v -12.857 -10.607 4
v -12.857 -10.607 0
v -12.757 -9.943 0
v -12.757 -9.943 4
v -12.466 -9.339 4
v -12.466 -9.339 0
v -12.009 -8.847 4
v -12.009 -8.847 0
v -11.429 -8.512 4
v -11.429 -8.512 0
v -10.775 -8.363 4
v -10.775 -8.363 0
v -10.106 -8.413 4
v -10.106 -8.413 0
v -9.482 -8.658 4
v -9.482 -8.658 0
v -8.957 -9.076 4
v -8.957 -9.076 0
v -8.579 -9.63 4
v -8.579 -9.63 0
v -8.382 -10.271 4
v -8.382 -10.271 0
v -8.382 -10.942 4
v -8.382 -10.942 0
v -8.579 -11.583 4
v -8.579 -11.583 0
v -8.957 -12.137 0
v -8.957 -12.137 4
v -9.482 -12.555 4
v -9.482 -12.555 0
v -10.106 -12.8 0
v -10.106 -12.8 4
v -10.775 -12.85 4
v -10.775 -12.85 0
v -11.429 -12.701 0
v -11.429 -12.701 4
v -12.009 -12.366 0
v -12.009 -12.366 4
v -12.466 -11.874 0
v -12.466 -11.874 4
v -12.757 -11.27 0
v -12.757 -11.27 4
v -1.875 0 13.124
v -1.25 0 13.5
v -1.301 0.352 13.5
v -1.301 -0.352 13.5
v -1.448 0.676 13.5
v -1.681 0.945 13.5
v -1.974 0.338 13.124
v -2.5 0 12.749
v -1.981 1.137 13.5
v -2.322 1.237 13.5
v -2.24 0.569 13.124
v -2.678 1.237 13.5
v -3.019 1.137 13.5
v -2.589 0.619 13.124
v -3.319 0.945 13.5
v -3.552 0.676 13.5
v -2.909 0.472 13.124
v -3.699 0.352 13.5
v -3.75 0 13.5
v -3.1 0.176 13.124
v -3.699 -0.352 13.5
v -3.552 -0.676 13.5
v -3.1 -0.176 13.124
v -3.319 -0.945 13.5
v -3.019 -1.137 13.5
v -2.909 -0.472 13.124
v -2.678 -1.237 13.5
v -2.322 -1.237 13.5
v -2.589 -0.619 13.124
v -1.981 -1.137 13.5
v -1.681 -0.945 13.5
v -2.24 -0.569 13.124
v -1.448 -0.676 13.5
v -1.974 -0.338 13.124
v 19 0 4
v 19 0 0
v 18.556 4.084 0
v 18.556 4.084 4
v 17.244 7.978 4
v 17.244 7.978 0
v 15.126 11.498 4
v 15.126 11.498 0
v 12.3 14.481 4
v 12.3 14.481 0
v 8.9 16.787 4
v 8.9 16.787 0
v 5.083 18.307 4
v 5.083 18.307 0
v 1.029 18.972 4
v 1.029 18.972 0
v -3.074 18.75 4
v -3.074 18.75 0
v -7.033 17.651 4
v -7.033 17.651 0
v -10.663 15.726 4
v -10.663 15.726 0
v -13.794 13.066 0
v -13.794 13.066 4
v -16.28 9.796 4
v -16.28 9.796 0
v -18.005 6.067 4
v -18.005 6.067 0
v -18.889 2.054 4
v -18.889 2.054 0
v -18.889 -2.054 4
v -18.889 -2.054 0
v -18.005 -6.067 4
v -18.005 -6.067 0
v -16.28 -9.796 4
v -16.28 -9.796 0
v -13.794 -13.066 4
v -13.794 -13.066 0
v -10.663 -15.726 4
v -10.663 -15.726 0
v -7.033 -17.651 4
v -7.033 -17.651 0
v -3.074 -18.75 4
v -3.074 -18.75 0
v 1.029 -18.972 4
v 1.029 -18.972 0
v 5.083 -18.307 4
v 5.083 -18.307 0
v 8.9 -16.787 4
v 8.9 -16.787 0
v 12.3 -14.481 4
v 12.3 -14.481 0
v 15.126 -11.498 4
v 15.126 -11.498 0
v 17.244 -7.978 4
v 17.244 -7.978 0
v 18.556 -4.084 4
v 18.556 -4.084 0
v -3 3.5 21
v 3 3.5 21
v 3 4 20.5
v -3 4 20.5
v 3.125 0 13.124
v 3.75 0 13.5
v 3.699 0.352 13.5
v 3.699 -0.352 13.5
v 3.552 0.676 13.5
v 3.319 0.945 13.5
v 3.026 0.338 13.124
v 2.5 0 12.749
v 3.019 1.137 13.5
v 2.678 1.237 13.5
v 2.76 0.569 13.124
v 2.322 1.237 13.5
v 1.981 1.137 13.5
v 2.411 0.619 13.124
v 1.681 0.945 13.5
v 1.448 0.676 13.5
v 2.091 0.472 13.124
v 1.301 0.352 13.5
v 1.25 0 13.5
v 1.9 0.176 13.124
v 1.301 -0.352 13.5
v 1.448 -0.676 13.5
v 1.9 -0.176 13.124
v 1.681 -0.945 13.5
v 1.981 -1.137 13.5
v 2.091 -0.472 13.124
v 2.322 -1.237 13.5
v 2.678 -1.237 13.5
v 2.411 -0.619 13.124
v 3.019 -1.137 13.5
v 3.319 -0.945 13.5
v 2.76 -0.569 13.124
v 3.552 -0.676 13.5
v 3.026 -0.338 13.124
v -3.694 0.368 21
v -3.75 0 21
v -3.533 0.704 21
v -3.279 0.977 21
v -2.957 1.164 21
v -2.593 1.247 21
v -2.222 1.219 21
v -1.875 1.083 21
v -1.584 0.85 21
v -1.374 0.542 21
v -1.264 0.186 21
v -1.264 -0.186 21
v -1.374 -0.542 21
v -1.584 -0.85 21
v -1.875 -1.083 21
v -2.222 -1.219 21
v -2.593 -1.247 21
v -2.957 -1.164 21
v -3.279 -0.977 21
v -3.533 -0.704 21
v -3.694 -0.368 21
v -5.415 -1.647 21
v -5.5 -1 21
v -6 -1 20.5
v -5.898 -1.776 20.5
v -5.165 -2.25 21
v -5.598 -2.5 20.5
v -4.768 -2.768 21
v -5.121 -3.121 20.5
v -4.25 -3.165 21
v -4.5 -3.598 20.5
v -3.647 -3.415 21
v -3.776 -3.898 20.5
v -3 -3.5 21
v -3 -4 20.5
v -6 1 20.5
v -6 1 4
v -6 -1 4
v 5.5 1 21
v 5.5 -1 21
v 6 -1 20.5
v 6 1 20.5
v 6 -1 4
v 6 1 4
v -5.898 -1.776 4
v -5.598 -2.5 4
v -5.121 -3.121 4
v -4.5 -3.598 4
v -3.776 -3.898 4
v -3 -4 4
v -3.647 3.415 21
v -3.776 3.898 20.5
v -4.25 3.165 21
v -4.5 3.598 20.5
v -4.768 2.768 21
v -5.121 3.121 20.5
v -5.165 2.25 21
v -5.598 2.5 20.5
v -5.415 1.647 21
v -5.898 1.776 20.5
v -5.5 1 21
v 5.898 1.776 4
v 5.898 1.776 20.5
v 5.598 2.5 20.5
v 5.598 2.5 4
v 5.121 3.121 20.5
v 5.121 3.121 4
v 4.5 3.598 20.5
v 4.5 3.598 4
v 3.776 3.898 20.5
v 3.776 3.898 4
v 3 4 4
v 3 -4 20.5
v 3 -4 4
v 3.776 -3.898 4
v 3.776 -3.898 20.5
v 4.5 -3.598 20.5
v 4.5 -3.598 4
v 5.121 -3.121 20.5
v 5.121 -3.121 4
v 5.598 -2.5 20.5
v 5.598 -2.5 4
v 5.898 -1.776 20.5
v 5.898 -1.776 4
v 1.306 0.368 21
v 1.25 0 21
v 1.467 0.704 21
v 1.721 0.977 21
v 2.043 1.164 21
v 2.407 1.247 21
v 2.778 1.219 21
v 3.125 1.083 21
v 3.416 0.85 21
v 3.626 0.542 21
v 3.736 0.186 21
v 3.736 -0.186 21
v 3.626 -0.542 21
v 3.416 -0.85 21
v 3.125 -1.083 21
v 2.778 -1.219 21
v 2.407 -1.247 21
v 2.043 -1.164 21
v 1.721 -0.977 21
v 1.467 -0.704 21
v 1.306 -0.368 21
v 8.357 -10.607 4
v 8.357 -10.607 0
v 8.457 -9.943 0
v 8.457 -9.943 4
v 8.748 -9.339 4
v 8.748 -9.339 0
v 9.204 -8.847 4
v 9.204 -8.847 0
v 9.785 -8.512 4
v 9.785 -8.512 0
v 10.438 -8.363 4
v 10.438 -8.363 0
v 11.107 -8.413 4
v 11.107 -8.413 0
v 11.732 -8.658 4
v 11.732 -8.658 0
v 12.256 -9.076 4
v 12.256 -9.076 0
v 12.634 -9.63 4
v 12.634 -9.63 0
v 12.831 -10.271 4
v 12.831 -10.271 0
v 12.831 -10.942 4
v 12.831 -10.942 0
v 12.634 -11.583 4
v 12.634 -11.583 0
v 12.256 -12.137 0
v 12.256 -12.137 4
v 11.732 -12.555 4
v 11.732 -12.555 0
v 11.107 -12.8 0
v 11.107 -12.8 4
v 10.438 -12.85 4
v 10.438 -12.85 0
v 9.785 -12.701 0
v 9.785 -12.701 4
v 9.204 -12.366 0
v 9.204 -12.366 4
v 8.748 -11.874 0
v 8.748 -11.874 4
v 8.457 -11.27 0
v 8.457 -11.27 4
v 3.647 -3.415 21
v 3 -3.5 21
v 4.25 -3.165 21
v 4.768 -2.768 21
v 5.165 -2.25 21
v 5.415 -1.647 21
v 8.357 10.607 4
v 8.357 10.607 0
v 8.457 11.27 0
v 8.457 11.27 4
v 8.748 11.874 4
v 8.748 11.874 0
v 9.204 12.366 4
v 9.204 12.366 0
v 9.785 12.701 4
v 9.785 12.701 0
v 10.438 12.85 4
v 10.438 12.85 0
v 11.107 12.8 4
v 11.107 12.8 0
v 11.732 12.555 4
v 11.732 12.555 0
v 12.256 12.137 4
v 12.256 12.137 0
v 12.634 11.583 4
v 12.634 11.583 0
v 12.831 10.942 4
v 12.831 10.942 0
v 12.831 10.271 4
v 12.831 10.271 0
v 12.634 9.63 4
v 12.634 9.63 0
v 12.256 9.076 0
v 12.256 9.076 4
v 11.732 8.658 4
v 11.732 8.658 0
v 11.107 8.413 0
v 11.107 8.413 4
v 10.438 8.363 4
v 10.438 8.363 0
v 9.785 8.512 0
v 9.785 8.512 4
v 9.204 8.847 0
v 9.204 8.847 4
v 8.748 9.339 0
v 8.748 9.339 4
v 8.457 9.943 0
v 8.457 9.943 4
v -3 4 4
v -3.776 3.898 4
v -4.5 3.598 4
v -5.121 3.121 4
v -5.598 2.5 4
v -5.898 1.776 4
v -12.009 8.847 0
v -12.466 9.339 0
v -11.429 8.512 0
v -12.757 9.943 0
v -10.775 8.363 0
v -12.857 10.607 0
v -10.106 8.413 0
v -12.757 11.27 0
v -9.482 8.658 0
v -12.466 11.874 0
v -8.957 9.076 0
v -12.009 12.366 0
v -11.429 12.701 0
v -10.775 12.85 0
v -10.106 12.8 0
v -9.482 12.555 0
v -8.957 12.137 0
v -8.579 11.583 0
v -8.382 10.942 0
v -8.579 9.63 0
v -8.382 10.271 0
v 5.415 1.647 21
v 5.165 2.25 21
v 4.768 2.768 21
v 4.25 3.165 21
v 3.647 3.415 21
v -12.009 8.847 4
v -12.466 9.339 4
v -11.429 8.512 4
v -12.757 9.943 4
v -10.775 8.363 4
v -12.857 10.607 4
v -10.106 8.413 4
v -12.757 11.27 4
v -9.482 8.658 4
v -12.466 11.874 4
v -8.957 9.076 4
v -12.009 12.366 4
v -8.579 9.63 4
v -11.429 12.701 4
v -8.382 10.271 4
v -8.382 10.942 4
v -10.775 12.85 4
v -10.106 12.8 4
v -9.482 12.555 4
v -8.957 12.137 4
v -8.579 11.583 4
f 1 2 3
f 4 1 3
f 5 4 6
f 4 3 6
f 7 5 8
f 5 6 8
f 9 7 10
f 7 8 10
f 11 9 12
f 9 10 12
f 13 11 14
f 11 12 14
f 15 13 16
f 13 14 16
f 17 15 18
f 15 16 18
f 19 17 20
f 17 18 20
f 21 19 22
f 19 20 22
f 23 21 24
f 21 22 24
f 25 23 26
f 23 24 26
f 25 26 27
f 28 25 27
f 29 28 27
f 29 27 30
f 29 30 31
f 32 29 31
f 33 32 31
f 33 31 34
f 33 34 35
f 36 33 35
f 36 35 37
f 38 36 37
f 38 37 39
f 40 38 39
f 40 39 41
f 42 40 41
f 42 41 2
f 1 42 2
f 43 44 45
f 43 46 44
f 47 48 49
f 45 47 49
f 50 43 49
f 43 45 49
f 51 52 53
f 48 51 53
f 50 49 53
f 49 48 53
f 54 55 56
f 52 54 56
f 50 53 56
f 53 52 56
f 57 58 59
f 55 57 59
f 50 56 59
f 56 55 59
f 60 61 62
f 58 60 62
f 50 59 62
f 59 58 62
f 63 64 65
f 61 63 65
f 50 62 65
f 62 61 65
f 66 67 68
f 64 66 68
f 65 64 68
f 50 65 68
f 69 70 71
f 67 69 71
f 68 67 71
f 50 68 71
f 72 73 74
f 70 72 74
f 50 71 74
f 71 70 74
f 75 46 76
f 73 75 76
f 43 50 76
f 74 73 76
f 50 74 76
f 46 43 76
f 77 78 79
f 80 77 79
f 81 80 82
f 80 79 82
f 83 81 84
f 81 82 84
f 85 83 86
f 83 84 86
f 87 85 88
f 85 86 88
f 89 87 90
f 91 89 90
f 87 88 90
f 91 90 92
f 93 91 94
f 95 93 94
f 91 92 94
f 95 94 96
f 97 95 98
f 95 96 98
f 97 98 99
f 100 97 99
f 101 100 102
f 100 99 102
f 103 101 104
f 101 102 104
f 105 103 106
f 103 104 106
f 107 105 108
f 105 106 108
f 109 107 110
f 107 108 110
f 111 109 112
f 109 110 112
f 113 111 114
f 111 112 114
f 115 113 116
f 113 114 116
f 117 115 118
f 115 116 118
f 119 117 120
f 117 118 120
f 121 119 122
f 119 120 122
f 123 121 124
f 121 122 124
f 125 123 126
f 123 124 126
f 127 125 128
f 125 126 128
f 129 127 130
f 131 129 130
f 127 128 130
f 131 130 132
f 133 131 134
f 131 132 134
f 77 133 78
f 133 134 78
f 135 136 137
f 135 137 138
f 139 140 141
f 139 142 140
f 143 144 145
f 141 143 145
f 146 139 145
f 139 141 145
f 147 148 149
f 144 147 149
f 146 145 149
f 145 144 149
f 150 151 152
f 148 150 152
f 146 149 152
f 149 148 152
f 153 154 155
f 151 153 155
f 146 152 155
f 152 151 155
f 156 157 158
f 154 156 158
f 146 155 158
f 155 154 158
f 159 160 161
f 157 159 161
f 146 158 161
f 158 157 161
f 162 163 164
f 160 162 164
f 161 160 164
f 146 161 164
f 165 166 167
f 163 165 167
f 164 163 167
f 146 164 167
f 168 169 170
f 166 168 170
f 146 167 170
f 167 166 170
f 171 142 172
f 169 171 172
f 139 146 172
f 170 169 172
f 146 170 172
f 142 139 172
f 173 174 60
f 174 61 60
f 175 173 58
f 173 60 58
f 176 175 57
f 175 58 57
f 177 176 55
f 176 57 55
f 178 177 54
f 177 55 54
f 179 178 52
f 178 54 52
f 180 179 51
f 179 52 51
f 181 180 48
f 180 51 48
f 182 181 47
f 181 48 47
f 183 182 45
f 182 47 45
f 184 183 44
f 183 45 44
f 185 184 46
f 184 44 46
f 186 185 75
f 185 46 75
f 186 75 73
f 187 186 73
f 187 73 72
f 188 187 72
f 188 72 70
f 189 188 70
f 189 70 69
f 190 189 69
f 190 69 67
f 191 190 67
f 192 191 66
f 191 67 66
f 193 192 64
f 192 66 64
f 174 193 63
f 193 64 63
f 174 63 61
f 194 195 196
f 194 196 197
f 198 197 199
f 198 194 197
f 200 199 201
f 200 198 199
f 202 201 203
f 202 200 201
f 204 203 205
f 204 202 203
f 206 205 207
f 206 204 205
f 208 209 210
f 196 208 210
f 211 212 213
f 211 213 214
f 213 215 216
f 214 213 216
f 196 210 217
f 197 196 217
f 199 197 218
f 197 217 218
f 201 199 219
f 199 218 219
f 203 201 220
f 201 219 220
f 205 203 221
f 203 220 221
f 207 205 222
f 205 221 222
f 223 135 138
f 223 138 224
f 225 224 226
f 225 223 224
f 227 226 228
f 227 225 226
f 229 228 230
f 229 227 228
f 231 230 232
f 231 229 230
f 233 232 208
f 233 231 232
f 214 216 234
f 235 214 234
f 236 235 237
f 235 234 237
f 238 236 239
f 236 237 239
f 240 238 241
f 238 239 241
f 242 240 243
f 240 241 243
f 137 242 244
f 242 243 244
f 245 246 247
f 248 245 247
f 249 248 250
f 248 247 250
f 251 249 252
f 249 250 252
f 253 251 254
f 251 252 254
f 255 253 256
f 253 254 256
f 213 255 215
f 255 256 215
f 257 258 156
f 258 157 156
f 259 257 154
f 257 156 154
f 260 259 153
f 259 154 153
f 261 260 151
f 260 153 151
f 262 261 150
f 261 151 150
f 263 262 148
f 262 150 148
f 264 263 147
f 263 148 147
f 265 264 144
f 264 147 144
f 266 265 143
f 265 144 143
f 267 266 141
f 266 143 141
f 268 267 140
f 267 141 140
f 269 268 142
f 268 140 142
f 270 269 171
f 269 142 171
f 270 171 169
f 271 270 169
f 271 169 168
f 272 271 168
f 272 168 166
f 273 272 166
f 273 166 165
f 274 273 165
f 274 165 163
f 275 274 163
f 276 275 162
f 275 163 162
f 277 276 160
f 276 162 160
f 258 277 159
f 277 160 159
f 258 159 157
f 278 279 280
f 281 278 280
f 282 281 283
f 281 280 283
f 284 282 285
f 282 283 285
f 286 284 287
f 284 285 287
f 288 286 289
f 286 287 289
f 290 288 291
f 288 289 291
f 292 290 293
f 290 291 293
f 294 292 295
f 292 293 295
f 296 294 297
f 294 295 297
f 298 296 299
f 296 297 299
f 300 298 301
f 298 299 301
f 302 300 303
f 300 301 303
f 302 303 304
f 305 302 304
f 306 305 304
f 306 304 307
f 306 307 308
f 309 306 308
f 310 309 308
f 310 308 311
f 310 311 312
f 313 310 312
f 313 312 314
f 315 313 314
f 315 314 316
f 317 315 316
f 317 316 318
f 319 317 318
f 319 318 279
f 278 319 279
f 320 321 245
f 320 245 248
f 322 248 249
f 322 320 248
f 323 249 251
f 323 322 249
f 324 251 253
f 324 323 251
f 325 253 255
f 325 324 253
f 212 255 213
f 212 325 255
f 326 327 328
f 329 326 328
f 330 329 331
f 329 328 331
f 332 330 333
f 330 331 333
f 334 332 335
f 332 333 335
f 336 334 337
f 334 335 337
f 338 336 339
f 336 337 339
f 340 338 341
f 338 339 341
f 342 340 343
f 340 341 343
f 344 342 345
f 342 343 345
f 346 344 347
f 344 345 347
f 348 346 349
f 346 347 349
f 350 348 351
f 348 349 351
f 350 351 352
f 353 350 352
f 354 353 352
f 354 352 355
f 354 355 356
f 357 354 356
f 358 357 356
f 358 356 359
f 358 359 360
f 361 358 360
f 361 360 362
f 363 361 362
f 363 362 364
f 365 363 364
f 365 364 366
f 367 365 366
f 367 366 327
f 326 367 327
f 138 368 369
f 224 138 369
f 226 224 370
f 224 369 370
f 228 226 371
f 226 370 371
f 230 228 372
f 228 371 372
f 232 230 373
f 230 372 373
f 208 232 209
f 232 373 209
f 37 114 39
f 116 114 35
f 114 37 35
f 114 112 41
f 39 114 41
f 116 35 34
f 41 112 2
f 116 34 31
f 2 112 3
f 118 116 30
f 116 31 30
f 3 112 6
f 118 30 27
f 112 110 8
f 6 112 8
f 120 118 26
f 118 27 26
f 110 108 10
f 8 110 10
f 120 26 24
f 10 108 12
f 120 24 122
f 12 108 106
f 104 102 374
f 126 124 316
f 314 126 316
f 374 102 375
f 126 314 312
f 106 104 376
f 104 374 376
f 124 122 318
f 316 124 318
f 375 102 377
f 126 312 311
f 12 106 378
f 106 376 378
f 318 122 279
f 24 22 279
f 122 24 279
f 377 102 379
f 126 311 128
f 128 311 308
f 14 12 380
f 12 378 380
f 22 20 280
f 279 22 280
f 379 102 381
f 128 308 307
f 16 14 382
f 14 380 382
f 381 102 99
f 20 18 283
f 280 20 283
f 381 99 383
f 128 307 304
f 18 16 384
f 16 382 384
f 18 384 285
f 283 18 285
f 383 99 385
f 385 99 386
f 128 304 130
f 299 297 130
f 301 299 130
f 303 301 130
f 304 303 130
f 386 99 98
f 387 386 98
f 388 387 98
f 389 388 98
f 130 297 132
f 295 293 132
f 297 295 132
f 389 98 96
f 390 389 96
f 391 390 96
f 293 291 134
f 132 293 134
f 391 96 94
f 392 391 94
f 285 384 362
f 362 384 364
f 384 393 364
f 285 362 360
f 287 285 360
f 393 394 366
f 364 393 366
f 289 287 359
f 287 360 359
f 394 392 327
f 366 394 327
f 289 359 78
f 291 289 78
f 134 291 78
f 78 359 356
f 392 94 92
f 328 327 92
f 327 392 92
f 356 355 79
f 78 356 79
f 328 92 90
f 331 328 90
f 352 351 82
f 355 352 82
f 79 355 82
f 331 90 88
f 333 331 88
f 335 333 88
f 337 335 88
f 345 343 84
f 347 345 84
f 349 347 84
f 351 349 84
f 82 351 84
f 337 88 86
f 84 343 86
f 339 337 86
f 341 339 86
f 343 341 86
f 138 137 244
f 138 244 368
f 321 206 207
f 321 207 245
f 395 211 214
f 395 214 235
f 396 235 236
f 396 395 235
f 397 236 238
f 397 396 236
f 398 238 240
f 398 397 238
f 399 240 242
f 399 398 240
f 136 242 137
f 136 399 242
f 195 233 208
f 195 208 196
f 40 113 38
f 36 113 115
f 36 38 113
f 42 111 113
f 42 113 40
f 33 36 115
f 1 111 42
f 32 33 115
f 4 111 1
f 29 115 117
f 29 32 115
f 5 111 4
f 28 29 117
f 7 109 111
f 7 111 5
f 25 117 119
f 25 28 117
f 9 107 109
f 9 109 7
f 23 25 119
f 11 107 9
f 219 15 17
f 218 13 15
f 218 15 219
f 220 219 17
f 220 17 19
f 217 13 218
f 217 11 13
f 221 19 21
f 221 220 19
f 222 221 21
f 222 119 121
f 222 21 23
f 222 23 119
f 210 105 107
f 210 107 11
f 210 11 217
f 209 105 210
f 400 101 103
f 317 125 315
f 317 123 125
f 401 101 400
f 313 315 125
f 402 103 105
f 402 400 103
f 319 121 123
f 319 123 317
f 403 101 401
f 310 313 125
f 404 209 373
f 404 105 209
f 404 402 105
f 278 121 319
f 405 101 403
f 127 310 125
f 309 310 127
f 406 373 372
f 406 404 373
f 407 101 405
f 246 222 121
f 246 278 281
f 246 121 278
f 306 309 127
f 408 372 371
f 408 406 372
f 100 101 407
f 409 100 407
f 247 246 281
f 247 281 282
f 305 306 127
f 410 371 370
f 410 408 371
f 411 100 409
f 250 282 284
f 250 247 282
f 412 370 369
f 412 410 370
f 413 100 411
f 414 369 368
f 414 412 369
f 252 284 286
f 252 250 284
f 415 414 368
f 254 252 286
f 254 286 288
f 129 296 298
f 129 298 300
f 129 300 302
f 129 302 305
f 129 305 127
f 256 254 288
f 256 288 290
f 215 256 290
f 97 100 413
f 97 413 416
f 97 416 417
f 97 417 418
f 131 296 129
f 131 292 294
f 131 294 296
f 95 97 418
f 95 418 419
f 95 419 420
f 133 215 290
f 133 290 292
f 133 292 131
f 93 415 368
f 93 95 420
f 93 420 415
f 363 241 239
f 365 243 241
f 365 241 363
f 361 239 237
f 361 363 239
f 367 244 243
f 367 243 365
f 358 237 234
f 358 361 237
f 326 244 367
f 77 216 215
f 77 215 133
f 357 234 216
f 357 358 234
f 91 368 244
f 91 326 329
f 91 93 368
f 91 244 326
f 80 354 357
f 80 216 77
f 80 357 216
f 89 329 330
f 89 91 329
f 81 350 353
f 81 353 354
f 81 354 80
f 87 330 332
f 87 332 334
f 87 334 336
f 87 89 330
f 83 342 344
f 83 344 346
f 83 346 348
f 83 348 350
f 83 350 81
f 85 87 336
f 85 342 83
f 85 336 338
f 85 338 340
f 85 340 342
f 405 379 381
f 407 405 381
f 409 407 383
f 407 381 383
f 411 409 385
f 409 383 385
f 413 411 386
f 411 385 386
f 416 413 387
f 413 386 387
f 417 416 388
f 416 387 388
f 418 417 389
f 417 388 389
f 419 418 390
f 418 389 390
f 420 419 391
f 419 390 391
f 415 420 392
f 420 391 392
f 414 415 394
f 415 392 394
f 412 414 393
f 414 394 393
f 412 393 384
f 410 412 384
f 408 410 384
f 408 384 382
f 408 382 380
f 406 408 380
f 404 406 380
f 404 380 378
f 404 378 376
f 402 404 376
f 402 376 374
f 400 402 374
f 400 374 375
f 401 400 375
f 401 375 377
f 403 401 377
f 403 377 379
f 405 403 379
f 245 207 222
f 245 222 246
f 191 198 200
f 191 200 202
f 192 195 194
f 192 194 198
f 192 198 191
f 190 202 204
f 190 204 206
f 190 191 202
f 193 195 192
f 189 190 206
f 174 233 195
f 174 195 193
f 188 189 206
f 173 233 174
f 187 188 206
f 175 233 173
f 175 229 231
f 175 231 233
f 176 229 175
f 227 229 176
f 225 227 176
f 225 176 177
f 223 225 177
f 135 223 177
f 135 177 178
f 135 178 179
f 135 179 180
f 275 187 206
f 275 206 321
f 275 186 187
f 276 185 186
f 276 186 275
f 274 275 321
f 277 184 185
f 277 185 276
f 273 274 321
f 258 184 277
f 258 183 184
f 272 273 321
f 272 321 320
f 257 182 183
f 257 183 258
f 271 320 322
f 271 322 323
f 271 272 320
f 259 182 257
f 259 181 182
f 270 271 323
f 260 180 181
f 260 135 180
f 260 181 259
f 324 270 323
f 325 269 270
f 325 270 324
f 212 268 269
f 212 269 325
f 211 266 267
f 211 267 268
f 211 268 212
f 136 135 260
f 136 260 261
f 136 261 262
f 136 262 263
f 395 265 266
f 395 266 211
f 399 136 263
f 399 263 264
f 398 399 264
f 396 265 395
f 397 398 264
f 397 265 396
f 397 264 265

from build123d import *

# Parameters (mm, degrees)
SKETCH1_R                 = 19
BOSS_EXTRUDE1_DEPTH       = 4
M4_CLEARANCE_HOLE1_D      = 4.5
BOSS_EXTRUDE2_DEPTH       = 17
CHAMFER1_SIZE             = 0.5
M3X0_5_TAPPED_HOLE1_D     = 2.5
M3X0_5_TAPPED_HOLE1_DEPTH = 7.5
M3X0_5_TAPPED_HOLE1_TIP   = 0.751075774


with BuildPart() as part:
    # Sketch1 → Boss-Extrude1 (new body)
    with BuildSketch(Plane.XY):
        Circle(SKETCH1_R)
    extrude(amount=BOSS_EXTRUDE1_DEPTH)

    # M4 Clearance Hole1 (through all)
    with Locations(Plane.XY.offset(4)):
        with Locations((10.606601718, 10.606601718), (-10.606601718, -10.606601718), (-10.606601718, 10.606601718), (10.606601718, -10.606601718)):
            Hole(M4_CLEARANCE_HOLE1_D / 2)

    # Sketch4 → Boss-Extrude2 (add)
    with BuildSketch(Plane.XY.offset(4)):
        with BuildLine():
            Line((-3, -4), (3, -4))
            ThreePointArc((3, -4), (5.121320344, -3.121320344), (6, -1))
            Line((6, -1), (6, 1))
            ThreePointArc((6, 1), (5.121320344, 3.121320344), (3, 4))
            Line((3, 4), (-3, 4))
            ThreePointArc((-3, 4), (-5.121320344, 3.121320344), (-6, 1))
            Line((-6, 1), (-6, -1))
            ThreePointArc((-6, -1), (-5.121320344, -3.121320344), (-3, -4))
        make_face()
    extrude(amount=BOSS_EXTRUDE2_DEPTH)

    # Chamfer1
    chamfer1_edges = [part.edges().sort_by_distance(p)[0] for p in [
        (5.121320344, 3.121320344, 21),
        (0, 4, 21),
        (-5.121320344, 3.121320344, 21),
        (-6, 0, 21),
        (-5.121320344, -3.121320344, 21),
        (0, -4, 21),
        (5.121320344, -3.121320344, 21),
        (6, 0, 21),
    ]]
    chamfer(chamfer1_edges, length=CHAMFER1_SIZE)

    # M3x0.5 Tapped Hole1
    with Locations(Plane.XY.offset(21)):
        with Locations((-2.5, 0), (2.5, 0)):
            Hole(M3X0_5_TAPPED_HOLE1_D / 2, depth=M3X0_5_TAPPED_HOLE1_DEPTH)
            with Locations((0, 0, -(M3X0_5_TAPPED_HOLE1_DEPTH + M3X0_5_TAPPED_HOLE1_TIP / 2))):  # 118° drill point
                Cone(0, M3X0_5_TAPPED_HOLE1_D / 2, M3X0_5_TAPPED_HOLE1_TIP, mode=Mode.SUBTRACT)


solid = part.part
